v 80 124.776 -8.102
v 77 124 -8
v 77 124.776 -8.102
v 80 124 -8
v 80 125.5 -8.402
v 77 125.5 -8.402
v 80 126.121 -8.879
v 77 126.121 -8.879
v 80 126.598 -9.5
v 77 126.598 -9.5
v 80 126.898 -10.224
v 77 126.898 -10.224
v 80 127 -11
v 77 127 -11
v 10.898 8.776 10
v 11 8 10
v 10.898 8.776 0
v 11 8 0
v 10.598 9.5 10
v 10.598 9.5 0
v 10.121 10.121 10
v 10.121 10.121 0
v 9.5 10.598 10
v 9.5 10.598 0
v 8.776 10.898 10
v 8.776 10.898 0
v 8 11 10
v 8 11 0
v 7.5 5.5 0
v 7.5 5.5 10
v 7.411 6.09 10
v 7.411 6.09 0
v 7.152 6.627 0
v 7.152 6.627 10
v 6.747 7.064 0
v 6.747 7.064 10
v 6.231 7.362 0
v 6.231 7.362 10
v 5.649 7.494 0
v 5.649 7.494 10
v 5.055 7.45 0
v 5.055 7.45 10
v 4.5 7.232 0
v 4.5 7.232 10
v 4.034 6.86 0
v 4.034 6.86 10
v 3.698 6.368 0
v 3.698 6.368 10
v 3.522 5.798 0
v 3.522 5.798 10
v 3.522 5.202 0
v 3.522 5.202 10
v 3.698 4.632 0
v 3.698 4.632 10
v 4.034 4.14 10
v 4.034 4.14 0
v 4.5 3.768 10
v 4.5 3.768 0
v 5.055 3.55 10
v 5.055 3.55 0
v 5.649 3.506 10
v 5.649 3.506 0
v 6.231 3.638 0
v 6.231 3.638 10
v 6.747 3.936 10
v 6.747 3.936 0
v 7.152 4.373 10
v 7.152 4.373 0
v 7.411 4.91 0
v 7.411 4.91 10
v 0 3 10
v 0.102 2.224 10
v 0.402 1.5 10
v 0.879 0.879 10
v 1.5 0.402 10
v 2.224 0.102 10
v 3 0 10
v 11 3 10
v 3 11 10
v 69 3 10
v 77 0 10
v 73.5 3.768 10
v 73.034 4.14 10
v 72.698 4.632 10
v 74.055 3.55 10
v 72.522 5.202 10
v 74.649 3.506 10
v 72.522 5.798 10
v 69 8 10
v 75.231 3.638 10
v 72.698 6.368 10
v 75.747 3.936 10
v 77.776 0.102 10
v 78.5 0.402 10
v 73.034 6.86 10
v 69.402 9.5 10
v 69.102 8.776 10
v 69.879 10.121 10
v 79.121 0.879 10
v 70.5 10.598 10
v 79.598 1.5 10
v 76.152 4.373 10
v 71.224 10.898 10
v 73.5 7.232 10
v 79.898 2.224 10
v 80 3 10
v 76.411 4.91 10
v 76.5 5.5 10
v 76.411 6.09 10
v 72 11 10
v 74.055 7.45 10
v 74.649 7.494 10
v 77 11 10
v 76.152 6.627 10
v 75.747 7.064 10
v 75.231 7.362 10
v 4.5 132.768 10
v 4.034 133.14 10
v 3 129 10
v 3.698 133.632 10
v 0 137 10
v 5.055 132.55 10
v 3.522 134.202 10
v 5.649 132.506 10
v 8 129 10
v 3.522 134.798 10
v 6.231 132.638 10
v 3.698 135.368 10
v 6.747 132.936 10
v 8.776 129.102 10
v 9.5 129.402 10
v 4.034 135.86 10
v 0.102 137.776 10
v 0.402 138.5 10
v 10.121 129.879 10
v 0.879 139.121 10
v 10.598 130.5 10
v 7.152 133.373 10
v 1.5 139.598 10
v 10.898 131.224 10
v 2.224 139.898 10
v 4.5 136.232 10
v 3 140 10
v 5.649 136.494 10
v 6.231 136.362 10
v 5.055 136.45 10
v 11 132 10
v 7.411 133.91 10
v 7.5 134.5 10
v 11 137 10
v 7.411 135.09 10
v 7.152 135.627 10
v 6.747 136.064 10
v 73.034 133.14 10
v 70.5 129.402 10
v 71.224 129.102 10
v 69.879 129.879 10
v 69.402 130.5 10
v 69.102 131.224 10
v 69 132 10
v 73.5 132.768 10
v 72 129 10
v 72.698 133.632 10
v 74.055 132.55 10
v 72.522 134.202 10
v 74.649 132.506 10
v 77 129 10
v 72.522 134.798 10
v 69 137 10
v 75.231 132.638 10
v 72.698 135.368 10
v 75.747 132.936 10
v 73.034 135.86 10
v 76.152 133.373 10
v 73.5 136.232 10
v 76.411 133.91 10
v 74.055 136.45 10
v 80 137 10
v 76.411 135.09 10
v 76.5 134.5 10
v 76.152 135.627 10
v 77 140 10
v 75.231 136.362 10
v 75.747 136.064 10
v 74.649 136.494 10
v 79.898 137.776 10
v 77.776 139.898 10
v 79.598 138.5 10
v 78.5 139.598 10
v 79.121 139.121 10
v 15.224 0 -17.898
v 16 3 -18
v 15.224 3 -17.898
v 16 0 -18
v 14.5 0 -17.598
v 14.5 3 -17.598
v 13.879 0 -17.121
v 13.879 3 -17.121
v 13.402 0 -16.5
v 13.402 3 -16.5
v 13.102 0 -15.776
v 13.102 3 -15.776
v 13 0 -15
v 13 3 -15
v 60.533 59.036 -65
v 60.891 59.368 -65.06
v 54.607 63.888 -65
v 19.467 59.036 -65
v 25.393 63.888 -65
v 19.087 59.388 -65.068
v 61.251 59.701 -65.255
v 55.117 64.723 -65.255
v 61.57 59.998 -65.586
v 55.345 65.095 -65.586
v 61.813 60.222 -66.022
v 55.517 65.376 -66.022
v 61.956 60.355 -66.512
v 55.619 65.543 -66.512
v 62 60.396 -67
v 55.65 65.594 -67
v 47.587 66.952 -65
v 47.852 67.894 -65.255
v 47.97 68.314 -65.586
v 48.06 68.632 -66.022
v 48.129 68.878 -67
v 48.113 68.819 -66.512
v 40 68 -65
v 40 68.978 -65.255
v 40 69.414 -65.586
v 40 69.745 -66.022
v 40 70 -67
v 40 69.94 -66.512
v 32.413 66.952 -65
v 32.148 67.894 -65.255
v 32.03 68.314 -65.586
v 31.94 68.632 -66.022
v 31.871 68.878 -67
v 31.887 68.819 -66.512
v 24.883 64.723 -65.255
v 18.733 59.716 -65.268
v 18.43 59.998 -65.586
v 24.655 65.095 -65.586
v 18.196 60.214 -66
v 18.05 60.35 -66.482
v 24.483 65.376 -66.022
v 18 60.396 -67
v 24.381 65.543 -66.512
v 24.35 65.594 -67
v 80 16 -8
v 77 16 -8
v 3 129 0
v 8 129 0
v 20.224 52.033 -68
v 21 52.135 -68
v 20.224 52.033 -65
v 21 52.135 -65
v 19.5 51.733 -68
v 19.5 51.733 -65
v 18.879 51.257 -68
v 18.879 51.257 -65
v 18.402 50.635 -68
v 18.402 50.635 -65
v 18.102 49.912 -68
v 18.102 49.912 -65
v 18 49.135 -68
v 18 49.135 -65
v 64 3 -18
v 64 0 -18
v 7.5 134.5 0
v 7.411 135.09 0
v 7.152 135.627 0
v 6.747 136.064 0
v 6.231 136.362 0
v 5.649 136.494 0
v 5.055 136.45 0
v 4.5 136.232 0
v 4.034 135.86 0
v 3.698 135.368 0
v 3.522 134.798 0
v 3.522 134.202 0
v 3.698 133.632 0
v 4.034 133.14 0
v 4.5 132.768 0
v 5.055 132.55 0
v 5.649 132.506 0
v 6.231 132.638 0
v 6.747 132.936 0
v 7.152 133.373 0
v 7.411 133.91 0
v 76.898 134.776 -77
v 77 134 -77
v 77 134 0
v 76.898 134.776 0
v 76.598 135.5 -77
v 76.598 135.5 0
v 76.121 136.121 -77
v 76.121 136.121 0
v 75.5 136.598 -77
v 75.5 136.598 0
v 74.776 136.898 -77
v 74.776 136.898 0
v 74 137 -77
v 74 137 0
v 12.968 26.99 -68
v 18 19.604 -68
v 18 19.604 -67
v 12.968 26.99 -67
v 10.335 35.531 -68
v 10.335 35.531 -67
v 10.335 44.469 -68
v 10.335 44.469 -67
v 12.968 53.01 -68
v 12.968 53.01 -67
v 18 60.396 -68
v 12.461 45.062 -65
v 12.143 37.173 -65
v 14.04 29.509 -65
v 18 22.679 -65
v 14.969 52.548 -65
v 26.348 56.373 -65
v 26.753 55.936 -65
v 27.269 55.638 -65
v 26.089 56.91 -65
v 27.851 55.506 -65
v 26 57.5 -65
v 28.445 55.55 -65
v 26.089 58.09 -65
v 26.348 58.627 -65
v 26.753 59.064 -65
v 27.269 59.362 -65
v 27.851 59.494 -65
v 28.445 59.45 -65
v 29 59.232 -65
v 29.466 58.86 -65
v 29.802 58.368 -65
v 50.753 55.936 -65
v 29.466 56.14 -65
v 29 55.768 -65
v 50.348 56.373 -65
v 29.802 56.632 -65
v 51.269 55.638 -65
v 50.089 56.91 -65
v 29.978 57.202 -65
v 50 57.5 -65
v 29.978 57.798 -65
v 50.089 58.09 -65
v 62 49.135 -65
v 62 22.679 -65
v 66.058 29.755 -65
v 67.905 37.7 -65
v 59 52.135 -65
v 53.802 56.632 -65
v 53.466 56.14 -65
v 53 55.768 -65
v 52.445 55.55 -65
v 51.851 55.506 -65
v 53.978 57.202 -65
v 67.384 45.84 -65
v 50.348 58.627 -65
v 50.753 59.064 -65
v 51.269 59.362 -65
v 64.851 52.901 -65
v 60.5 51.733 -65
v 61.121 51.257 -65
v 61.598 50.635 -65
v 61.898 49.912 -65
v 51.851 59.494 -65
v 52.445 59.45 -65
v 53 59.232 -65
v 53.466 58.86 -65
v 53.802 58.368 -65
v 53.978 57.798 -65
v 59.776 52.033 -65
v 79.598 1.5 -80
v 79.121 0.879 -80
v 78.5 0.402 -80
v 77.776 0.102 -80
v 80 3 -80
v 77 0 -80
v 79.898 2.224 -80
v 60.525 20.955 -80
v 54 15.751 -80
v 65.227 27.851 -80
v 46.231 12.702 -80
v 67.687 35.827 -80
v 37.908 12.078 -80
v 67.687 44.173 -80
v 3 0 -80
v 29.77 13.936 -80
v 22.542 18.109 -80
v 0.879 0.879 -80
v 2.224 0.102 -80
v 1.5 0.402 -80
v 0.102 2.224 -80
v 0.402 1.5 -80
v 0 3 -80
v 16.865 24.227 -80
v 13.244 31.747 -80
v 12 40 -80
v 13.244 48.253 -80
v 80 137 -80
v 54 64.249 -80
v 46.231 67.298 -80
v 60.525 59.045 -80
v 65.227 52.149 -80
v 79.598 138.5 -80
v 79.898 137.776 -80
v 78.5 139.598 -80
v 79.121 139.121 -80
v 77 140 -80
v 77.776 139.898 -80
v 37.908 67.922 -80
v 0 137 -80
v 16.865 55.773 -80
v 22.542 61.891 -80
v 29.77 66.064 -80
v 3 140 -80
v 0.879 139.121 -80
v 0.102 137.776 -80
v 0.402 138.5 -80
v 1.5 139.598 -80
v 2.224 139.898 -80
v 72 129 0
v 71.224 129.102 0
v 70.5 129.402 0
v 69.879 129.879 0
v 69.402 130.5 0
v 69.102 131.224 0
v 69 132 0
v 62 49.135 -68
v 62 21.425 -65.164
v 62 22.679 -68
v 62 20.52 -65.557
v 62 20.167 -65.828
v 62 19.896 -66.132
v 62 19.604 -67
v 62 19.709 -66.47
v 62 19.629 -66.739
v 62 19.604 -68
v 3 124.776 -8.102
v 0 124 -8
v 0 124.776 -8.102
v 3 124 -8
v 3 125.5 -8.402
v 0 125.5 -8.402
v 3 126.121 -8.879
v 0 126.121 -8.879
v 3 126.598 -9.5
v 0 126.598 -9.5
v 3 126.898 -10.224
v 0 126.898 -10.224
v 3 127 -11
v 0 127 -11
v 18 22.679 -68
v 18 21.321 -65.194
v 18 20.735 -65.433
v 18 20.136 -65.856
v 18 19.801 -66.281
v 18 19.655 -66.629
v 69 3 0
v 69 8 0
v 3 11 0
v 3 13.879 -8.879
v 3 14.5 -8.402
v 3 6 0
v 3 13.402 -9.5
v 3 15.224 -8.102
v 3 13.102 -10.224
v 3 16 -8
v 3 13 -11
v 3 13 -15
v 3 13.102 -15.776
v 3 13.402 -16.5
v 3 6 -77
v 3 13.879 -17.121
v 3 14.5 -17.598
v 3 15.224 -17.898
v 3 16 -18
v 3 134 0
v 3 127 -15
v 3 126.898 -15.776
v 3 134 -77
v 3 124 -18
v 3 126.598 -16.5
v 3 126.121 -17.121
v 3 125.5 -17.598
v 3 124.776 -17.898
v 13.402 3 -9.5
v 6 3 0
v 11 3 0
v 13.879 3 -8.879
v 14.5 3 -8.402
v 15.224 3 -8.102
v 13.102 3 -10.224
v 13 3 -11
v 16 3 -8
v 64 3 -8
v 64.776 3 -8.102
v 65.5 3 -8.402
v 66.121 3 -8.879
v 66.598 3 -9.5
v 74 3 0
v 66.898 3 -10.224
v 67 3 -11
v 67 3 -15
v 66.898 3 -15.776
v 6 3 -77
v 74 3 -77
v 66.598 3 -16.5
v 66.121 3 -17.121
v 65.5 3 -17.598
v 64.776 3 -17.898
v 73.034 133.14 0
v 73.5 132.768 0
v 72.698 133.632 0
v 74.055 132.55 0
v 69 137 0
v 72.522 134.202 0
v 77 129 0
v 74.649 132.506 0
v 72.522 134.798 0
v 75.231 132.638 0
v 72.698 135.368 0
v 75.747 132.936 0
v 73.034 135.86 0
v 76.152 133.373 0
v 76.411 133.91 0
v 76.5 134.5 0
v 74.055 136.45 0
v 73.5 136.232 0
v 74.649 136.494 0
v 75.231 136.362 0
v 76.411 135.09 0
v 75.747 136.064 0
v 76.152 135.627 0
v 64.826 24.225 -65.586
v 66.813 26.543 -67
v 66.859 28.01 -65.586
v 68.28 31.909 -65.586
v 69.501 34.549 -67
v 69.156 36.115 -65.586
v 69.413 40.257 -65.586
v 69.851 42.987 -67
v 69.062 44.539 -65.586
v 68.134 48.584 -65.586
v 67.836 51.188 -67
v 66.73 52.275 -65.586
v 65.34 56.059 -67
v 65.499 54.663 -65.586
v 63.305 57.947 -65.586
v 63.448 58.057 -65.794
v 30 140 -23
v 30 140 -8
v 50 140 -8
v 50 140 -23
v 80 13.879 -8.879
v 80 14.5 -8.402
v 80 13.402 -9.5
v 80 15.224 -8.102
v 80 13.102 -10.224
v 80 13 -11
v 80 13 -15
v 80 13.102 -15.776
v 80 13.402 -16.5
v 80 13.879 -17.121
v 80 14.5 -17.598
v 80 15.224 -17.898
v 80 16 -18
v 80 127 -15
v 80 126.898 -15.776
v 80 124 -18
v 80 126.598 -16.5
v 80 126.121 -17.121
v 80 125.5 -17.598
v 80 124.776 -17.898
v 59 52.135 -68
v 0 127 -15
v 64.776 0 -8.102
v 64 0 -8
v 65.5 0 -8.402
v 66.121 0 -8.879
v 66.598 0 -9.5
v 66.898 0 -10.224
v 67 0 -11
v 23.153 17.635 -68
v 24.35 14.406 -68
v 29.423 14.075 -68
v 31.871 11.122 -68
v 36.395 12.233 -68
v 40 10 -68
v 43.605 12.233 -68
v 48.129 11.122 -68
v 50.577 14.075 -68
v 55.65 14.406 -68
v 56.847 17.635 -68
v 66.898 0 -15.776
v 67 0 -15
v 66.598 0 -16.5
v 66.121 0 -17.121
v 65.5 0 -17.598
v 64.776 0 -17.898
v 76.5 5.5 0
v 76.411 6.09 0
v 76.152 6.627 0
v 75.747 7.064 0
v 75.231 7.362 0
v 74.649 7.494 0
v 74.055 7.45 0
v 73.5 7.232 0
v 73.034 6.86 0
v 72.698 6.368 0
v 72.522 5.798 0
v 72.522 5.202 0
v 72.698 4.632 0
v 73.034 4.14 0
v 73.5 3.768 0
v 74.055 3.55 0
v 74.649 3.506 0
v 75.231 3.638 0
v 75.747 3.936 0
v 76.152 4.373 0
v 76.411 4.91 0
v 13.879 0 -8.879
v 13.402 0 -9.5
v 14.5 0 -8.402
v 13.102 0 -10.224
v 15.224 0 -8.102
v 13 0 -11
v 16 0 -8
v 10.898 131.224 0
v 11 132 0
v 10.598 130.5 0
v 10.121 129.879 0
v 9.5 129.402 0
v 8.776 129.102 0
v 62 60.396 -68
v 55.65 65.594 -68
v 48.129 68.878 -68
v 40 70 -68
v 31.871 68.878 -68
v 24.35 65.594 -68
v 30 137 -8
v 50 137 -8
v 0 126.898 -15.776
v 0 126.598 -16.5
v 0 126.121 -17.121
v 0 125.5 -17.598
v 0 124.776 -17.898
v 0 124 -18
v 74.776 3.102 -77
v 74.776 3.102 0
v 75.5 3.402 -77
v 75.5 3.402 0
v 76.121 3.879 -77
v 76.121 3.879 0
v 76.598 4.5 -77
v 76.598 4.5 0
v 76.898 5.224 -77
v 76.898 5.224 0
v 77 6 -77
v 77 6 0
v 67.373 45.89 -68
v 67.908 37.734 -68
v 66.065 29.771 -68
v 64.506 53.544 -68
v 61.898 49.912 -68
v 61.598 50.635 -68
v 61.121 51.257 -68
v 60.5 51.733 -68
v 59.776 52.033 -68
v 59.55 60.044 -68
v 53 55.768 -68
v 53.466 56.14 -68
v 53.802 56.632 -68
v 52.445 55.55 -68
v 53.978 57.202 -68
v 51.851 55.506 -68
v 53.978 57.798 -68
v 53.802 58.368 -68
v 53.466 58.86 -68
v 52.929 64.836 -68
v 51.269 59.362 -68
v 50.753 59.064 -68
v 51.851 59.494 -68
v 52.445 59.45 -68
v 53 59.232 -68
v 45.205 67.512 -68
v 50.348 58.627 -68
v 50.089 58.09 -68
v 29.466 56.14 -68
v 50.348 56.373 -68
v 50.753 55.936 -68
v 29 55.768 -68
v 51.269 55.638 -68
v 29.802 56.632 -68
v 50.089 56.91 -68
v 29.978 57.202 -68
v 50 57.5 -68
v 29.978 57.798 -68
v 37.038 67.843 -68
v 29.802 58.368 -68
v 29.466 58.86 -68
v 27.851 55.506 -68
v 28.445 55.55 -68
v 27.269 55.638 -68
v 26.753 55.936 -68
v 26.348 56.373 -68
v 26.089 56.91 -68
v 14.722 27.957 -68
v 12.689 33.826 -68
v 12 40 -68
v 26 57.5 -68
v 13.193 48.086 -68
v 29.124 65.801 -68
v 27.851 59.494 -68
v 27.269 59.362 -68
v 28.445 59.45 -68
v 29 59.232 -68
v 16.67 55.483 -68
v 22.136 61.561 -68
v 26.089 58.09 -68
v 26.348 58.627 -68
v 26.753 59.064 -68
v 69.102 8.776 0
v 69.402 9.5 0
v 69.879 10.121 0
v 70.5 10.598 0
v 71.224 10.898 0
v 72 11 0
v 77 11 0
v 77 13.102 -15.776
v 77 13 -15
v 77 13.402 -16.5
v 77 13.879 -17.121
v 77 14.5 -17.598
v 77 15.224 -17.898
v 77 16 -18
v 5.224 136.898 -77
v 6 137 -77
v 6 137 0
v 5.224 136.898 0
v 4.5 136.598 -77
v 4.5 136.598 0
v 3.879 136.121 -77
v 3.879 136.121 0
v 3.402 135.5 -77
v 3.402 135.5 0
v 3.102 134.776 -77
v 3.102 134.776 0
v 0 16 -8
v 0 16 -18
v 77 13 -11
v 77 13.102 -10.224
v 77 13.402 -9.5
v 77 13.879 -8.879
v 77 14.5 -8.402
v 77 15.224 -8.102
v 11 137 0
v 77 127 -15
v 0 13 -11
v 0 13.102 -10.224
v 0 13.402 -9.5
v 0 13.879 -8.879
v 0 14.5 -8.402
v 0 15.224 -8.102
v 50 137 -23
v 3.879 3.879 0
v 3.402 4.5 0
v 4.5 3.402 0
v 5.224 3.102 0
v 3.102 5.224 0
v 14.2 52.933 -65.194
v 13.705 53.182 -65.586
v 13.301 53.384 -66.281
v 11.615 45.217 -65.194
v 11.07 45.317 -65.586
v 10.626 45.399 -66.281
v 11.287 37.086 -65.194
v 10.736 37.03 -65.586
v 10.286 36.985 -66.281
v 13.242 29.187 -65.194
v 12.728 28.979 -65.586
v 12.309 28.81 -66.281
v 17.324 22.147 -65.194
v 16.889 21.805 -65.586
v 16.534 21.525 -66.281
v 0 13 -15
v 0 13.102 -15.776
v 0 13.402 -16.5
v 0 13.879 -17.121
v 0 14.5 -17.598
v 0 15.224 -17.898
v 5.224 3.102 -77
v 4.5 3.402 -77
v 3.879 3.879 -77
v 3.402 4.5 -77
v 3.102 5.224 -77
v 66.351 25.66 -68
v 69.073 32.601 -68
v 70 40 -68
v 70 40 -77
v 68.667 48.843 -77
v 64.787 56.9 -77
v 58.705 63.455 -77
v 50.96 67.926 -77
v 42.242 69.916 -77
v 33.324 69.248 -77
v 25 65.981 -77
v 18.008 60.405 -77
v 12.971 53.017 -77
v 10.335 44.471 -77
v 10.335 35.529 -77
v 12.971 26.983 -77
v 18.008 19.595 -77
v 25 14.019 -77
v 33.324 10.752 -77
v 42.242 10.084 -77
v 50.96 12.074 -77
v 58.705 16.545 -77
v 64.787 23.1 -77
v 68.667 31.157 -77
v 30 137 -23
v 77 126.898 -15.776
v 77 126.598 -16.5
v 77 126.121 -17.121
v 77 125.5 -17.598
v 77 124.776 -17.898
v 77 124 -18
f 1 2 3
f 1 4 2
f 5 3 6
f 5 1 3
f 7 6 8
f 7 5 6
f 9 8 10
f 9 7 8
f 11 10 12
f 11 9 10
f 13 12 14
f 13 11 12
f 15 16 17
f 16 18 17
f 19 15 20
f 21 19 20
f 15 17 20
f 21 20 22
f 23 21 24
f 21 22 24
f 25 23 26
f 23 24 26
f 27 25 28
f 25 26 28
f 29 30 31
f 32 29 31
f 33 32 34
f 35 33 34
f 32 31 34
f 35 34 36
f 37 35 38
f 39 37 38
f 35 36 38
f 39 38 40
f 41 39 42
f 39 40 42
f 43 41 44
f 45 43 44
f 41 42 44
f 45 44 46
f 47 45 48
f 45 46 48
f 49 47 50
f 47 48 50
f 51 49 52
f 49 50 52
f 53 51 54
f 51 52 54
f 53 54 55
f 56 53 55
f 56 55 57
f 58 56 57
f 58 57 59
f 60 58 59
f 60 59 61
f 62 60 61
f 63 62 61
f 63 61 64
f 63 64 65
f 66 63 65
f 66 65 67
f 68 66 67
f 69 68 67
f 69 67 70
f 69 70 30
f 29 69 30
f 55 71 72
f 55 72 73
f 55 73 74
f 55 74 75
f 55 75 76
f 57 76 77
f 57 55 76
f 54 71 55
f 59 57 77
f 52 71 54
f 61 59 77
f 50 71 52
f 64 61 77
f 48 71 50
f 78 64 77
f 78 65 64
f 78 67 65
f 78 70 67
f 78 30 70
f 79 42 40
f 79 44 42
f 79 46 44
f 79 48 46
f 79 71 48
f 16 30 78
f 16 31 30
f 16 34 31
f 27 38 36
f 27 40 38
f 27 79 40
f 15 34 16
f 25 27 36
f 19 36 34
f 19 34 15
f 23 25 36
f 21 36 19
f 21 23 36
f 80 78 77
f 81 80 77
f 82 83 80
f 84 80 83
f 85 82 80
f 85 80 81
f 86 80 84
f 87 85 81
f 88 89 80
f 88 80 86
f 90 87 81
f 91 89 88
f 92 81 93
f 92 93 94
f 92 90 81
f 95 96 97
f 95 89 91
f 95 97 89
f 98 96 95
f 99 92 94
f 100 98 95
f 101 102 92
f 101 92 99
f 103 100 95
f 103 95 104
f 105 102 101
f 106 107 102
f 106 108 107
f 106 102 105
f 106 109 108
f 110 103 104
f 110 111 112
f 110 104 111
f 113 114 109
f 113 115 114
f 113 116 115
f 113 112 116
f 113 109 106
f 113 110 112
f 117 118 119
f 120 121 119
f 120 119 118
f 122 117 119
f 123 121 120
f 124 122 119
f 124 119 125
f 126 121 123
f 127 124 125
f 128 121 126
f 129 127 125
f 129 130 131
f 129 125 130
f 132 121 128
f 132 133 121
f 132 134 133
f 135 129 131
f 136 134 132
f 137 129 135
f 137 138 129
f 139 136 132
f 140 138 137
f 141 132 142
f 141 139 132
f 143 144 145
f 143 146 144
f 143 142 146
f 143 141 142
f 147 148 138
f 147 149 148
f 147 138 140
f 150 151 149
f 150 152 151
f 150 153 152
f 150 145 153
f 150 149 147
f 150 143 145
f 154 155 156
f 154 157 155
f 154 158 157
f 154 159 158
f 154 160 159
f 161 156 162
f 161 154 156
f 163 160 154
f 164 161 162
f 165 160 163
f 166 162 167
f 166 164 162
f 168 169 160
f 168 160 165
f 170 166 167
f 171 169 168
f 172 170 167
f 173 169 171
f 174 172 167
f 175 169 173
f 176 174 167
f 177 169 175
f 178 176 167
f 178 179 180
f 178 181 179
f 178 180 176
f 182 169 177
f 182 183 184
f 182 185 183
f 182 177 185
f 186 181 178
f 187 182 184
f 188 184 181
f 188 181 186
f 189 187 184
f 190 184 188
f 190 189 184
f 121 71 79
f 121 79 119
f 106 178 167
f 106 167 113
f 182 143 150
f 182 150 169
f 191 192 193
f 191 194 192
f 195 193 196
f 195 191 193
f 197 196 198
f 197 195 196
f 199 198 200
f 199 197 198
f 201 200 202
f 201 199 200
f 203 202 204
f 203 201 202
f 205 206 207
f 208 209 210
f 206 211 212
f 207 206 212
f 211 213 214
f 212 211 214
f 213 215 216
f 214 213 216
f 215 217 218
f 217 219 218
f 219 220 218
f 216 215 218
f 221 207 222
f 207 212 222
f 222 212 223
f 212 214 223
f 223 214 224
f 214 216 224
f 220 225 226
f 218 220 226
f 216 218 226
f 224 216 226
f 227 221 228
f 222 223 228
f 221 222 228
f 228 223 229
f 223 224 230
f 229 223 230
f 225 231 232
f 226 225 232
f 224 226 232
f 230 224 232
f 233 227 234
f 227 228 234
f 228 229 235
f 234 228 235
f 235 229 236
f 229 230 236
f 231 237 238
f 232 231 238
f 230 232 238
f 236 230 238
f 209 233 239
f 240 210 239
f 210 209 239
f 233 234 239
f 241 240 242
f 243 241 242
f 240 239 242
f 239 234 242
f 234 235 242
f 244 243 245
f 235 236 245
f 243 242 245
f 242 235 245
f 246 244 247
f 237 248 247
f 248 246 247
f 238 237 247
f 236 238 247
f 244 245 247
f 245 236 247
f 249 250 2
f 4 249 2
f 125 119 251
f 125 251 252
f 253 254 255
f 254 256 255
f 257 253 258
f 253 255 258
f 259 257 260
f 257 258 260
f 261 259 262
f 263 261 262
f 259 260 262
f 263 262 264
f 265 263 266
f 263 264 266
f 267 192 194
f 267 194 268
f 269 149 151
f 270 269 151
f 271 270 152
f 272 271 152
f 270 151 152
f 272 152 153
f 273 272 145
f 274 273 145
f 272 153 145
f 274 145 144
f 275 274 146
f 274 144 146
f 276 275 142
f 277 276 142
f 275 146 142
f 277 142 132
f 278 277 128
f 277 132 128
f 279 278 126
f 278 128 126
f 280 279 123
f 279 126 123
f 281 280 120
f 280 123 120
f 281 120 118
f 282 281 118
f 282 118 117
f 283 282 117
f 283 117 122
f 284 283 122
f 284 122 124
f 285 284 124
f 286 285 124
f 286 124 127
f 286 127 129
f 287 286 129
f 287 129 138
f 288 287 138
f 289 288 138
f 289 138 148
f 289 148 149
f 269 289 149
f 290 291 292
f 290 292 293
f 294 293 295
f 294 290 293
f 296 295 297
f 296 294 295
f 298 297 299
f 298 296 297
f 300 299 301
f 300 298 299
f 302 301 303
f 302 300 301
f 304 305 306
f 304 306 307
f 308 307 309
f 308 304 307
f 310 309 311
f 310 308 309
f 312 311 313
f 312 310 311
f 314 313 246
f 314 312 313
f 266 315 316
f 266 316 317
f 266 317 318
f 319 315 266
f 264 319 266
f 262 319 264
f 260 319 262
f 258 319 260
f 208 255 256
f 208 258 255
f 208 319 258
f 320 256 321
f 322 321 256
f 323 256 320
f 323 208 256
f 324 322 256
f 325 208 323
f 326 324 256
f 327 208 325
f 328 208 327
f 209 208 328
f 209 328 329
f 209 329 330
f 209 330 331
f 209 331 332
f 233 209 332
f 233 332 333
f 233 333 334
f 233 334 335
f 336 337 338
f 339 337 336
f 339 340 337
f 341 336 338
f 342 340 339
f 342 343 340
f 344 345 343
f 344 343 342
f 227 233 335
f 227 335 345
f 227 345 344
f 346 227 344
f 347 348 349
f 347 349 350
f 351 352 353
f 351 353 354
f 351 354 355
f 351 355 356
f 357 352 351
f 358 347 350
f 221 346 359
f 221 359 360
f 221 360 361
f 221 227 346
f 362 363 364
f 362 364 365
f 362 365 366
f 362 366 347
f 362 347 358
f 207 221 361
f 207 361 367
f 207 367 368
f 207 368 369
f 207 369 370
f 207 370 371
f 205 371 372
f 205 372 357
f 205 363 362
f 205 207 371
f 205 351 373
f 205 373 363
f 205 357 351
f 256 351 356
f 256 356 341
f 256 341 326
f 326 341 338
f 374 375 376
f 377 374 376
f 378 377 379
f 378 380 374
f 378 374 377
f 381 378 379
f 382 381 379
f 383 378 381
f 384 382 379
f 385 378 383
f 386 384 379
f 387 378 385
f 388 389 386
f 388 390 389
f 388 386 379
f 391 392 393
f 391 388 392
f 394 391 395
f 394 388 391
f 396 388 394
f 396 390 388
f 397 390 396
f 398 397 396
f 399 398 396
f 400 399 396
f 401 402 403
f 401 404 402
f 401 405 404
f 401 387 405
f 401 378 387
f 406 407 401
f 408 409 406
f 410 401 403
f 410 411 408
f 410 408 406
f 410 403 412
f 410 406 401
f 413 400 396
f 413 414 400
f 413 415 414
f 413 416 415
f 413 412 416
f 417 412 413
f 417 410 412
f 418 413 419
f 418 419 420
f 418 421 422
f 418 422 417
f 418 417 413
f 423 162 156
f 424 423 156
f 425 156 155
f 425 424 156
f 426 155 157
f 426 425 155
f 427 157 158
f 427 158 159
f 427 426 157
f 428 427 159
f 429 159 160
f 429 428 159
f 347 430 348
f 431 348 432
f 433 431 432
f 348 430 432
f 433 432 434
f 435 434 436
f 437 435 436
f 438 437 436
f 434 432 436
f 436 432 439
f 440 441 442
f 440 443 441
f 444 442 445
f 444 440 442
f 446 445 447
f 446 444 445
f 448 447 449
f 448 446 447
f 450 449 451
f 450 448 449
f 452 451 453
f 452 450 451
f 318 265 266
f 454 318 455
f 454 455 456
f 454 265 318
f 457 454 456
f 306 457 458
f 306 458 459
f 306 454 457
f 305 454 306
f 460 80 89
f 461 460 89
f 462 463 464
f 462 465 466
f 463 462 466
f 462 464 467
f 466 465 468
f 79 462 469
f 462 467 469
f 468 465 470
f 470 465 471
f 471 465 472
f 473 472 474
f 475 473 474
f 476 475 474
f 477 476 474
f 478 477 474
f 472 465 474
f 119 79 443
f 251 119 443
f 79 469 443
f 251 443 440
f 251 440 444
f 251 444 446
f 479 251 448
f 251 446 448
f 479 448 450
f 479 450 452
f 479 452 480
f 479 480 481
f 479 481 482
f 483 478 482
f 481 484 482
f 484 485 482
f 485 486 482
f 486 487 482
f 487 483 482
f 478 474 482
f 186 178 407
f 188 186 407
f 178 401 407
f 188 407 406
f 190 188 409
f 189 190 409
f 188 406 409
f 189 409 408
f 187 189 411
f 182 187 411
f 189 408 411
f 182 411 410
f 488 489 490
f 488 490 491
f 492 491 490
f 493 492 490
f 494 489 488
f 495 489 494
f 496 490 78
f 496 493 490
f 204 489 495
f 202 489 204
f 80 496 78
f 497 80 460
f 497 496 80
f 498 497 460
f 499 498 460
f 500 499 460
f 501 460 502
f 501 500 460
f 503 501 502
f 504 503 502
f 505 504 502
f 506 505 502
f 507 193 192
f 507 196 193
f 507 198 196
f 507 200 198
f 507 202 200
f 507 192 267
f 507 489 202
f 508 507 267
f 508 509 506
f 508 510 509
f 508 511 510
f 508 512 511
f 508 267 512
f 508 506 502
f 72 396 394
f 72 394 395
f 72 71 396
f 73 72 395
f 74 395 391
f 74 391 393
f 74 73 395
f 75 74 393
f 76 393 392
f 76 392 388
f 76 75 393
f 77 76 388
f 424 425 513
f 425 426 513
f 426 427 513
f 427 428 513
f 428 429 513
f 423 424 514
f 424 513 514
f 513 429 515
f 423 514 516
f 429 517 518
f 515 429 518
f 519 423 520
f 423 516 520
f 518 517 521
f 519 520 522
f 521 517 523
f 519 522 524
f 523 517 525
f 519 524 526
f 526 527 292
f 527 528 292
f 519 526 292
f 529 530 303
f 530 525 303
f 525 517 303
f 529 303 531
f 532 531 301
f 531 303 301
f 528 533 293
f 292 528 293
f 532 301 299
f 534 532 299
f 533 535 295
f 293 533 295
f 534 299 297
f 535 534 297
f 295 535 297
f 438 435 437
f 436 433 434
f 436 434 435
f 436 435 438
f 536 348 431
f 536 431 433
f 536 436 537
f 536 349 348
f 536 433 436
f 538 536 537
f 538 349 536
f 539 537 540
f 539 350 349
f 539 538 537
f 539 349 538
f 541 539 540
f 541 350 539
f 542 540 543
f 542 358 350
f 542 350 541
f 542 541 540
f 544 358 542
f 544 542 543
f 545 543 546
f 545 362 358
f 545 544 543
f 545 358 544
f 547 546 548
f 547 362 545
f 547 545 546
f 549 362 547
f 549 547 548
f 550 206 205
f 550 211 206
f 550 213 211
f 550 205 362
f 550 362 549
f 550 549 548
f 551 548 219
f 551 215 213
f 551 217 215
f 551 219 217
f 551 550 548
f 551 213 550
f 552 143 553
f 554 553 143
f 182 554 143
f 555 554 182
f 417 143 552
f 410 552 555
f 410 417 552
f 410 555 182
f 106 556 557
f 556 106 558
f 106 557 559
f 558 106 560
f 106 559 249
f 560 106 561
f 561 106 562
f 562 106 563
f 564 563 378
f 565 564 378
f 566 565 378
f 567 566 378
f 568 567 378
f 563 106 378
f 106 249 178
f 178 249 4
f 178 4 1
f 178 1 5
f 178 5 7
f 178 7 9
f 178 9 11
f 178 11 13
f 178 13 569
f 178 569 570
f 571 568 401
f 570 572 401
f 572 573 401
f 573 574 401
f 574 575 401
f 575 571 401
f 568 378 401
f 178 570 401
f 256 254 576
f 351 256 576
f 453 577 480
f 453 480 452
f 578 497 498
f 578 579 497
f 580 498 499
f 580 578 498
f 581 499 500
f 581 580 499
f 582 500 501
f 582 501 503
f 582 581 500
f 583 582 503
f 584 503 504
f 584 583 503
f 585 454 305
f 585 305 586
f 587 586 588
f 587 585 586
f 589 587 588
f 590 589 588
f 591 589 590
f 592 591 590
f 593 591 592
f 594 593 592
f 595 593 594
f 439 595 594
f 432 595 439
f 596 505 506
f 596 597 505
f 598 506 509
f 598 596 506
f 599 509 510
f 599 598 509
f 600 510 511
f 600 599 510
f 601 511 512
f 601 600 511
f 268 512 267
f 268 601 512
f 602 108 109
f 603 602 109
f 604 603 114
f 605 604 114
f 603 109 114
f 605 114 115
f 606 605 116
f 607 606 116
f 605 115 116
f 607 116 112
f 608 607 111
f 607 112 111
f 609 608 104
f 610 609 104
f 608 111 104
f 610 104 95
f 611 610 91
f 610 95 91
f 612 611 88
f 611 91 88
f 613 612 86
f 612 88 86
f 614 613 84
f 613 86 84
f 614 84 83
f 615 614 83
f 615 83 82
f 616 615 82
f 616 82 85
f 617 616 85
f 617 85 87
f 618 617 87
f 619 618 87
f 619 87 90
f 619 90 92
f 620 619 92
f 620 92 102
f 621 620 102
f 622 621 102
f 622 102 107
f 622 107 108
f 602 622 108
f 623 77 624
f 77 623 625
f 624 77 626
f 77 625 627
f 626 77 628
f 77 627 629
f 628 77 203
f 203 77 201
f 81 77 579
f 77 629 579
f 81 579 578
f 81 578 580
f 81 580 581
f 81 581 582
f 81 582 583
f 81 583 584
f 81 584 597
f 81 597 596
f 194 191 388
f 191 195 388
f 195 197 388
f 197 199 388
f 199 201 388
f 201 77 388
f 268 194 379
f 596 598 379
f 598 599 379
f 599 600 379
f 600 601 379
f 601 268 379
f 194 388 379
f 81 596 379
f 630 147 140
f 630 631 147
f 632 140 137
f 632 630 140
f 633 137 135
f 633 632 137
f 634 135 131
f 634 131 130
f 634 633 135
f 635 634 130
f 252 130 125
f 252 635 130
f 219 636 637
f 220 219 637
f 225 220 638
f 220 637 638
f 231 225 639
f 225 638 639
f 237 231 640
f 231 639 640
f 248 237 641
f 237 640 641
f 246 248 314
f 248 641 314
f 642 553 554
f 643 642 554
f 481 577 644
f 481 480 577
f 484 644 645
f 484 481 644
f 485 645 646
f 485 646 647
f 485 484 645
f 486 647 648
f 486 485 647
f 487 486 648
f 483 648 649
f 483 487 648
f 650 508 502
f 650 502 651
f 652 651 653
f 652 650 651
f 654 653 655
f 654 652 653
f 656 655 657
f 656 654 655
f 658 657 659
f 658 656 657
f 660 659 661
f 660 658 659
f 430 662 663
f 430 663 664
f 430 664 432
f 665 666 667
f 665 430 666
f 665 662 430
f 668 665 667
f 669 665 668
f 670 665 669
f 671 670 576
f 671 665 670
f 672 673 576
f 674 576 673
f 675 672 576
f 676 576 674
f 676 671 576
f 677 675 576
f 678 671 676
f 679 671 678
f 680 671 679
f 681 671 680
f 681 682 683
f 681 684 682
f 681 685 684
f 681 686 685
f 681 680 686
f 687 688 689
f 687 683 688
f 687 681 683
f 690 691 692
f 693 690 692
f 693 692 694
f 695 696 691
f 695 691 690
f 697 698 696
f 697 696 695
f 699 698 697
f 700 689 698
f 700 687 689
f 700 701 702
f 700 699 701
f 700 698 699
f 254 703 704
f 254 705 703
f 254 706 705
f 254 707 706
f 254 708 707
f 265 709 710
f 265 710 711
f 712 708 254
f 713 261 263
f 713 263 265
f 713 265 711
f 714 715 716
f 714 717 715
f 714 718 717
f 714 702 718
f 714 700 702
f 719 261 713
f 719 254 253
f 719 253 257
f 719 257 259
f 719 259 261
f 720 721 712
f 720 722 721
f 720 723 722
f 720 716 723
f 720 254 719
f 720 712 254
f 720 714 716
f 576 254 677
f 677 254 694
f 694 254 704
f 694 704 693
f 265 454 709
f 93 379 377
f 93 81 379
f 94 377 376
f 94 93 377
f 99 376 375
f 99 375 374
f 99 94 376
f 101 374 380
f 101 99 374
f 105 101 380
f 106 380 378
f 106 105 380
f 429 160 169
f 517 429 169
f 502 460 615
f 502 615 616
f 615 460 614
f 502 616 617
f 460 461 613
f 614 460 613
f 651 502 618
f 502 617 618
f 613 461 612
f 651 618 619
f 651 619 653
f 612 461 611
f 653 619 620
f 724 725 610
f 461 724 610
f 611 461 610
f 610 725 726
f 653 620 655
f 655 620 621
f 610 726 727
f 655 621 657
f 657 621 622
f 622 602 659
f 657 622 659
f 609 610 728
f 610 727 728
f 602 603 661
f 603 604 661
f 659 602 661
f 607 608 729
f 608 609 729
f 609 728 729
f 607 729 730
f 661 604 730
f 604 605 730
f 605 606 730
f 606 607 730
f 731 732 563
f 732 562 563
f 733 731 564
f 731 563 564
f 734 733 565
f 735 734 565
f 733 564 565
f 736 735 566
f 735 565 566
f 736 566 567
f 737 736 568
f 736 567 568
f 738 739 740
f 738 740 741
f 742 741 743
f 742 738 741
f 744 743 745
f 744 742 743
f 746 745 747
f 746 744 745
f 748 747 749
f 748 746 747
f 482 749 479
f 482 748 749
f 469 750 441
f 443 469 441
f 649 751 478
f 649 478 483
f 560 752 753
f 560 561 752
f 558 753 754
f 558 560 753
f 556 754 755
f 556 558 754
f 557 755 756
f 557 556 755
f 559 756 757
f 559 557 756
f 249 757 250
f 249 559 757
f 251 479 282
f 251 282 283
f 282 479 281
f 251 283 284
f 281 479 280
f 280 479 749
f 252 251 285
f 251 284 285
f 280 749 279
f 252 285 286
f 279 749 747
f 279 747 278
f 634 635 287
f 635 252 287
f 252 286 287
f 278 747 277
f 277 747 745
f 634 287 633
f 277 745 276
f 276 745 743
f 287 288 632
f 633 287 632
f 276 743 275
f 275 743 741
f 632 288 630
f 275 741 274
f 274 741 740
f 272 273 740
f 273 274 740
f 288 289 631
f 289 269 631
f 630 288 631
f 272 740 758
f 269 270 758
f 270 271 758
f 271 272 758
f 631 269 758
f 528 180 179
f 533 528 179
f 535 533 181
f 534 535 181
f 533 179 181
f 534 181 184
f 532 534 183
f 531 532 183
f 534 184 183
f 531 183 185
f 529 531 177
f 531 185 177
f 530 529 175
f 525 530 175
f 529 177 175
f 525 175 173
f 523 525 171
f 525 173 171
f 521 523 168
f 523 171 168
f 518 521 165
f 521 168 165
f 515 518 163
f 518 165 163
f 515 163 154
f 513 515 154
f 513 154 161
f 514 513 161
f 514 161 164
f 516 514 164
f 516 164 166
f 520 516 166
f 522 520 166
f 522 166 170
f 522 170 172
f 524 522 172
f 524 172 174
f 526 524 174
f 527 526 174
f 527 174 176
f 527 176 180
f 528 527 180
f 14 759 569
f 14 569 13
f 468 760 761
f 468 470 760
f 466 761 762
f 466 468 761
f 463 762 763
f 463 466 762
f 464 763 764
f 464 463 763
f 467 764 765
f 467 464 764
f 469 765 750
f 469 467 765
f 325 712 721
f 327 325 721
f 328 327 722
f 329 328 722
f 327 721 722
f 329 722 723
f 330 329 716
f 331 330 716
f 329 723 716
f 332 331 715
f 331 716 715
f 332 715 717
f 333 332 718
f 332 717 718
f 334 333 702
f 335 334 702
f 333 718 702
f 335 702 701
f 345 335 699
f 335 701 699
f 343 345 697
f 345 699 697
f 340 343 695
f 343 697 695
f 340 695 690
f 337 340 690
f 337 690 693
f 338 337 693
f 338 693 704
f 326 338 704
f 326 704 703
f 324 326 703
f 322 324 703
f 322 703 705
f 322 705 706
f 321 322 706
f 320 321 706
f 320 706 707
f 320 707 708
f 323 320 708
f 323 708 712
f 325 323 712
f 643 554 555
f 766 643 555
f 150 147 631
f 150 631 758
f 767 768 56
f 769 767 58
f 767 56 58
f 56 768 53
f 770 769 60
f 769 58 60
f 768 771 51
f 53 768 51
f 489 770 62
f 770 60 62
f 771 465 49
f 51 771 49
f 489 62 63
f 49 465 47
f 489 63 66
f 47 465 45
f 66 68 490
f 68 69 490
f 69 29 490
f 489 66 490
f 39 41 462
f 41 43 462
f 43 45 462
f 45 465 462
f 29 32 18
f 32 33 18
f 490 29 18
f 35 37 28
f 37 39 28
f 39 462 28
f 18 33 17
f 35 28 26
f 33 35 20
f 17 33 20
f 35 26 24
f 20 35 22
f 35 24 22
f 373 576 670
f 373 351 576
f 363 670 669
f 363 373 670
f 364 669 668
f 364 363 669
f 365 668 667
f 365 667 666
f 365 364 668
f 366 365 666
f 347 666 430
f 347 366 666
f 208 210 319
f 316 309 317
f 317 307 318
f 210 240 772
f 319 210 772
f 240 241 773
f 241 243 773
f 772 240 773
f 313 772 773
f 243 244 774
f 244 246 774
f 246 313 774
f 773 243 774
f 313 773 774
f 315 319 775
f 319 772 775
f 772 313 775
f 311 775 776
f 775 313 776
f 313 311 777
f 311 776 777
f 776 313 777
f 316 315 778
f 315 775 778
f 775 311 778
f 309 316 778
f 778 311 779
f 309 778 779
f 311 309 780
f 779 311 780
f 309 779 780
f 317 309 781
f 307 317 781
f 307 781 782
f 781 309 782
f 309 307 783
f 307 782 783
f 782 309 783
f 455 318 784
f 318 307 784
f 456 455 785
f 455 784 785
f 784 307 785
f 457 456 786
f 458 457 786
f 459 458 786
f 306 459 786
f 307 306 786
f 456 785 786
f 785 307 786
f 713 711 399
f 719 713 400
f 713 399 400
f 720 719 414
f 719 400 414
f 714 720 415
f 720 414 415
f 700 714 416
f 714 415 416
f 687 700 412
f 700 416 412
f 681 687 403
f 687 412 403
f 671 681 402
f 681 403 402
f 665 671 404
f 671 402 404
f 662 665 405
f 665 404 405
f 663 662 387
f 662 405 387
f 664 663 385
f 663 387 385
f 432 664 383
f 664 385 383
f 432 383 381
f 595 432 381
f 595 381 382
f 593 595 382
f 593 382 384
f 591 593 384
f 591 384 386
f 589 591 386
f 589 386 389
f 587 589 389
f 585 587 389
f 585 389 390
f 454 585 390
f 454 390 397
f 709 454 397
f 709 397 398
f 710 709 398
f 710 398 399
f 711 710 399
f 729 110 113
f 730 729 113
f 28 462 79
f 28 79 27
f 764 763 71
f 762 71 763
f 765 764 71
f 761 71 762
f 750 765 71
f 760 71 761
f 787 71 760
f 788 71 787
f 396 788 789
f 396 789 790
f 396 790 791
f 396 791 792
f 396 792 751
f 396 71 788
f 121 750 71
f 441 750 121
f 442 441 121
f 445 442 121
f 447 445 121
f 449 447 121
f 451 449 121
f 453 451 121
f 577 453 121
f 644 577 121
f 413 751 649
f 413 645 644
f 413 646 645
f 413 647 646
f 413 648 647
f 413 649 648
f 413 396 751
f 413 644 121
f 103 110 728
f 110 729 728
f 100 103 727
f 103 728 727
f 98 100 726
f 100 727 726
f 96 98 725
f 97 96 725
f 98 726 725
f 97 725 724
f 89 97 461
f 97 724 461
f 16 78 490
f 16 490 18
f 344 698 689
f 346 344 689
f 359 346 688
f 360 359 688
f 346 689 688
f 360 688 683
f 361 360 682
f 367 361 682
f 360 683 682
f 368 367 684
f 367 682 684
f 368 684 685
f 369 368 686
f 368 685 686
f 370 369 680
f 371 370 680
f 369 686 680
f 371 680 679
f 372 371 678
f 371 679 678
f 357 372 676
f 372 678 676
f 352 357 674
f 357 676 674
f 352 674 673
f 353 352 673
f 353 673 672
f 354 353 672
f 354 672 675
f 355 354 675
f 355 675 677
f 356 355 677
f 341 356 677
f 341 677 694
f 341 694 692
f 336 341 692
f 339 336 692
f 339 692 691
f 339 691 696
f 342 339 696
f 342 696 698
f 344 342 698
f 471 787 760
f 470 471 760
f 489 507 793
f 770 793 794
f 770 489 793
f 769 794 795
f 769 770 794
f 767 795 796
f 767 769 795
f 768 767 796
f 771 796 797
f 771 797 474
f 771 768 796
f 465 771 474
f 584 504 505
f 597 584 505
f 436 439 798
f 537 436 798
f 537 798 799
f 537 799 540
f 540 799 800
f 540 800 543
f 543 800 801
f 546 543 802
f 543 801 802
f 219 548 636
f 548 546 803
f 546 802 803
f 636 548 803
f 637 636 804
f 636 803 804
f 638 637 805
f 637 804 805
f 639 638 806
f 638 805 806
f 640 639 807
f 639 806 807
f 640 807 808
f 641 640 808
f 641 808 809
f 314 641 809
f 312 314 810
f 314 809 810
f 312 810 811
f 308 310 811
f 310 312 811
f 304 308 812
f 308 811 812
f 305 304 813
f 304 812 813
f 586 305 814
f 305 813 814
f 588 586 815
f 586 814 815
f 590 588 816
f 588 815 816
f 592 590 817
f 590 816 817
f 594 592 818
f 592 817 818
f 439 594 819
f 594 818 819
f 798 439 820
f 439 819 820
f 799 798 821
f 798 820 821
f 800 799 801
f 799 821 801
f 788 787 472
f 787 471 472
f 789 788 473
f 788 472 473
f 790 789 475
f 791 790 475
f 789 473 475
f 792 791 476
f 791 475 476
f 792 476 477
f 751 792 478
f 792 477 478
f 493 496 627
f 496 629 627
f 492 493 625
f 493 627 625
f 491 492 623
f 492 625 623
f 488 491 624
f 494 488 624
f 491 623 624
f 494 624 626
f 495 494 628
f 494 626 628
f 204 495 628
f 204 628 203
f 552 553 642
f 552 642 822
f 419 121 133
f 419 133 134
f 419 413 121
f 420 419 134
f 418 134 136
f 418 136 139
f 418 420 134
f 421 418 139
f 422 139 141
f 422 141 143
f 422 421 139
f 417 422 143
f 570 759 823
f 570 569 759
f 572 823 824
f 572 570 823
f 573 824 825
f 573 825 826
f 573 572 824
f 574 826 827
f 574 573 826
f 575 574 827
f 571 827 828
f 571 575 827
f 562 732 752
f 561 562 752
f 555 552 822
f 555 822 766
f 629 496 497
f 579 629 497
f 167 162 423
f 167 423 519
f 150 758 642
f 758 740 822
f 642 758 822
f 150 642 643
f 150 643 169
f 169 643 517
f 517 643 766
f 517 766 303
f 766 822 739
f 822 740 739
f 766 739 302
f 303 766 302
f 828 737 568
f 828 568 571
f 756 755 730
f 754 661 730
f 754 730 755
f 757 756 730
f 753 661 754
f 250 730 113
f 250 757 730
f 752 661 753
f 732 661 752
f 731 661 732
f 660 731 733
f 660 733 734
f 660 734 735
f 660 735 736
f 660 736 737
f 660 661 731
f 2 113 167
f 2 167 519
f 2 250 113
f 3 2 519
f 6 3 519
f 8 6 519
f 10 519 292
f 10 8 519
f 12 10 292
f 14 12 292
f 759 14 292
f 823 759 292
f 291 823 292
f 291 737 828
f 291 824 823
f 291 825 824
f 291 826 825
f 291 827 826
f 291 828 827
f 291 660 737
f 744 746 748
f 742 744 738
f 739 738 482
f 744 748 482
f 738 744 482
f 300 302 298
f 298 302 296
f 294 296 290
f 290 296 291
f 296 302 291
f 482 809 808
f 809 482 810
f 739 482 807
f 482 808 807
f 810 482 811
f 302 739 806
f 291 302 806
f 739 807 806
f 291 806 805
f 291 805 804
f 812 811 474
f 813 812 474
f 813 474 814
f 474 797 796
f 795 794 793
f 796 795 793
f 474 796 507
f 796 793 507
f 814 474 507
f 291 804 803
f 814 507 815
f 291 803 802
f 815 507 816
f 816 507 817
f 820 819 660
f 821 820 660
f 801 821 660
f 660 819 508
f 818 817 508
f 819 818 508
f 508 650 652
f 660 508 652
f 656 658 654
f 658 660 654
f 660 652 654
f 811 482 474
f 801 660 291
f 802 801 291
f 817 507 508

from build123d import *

# Parameters (mm, degrees)
SKETCH1_W               = 80
SKETCH1_H               = 80
BOSS_EXTRUDE1_DEPTH     = 80
SHELL1_T                = -3
CUT_EXTRUDE1_REACH      = 140.564
SKETCH2_R               = 27
SKETCH3_R               = 30
SKETCH3_R_2             = 27
BOSS_EXTRUDE2_DEPTH     = 9
BOSS_EXTRUDE3_DEPTH     = 3
SKETCH5_W               = 104.199084268
SKETCH5_H               = 10
CUT_EXTRUDE2_DEPTH      = 139.564064606
CUT_EXTRUDE2_DEPTH_BACK = 139.564064606
BOSS_EXTRUDE4_DEPTH     = 3
FILLET3_R               = 3
FILLET4_R               = 2
CUT_EXTRUDE5_REACH      = 129.138
SKETCH9_R               = 2
SKETCH13_W              = 80
SKETCH13_H              = 60
BOSS_EXTRUDE6_DEPTH     = 70
SKETCH14_W              = 74
SKETCH14_H              = 60
CUT_EXTRUDE8_DEPTH      = 67
SKETCH15_W              = 80
SKETCH15_H              = 140
SKETCH15_W_2            = 74
SKETCH15_H_2            = 134
BOSS_EXTRUDE7_DEPTH     = 20
SKETCH12_R              = 28
CUT_EXTRUDE7_DEPTH      = 12
FILLET5_R               = 3
SKETCH16_W              = 9.113547255
SKETCH16_H              = 9.484027798
SKETCH16_W_2            = 8
SKETCH16_H_2            = 8
BOSS_EXTRUDE8_DEPTH     = 10
SKETCH17_W              = 10
SKETCH17_H              = 114
CUT_EXTRUDE9_DEPTH      = 181
CUT_EXTRUDE10_START     = -10
SKETCH18_W              = 54
SKETCH18_H              = 10
CUT_EXTRUDE10_DEPTH     = 171
FILLET6_R               = 3
CUT_EXTRUDE11_REACH     = 186.662
SKETCH19_R              = 2
FILLET7_R               = 3
CUT_EXTRUDE12_REACH     = 182
SKETCH20_W              = 20
SKETCH20_H              = 15


with BuildPart() as part:
    # Sketch1 → Boss-Extrude1 (new body)
    with BuildSketch(Plane(origin=(0, 0, 0), x_dir=(1, 0, 0), z_dir=(0, 1, 0))):
        with Locations((40, 40)):
            Rectangle(SKETCH1_W, SKETCH1_H)
    extrude(amount=BOSS_EXTRUDE1_DEPTH)

    # Shell1
    shell1_openings = [part.faces().sort_by_distance(p)[0] for p in [
        (40, 40, 0),
    ]]
    offset(amount=SHELL1_T, openings=shell1_openings, kind=Kind.INTERSECTION)

    # Sketch2 → Cut-Extrude1 (cut, up to next)
    with BuildSketch(Plane(origin=(0, 0, -80), x_dir=(-1, 0, 0), z_dir=(0, 0, -1)), mode=Mode.PRIVATE) as cut_extrude1_sk1:
        with Locations((-40, 40)):
            Circle(SKETCH2_R)
    cut_extrude1_tool1 = extrude(cut_extrude1_sk1.sketch, amount=-CUT_EXTRUDE1_REACH, mode=Mode.PRIVATE) & part.part
    add(cut_extrude1_tool1.solids().sort_by_distance((40, 40, -80))[0], mode=Mode.SUBTRACT)

    # Sketch3 → Boss-Extrude2 (add)
    with BuildSketch(Plane.XY.offset(-77)):
        with Locations((40, 40)):
            Circle(SKETCH3_R)
        with Locations(Location((40, 40, 0), (0, 0, 180))):
            Circle(SKETCH3_R_2, mode=Mode.SUBTRACT)
    extrude(amount=BOSS_EXTRUDE2_DEPTH)

    # Sketch4 → Boss-Extrude3 (add)
    with BuildSketch(Plane.XY.offset(-68)):
        with BuildLine():
            Line((18, 60.396078054), (18, 19.603921946))
            ThreePointArc((18, 19.603921946), (10, 40), (18, 60.396078054))
        make_face()
        with BuildLine():
            Line((62, 60.396078054), (62, 19.603921946))
            ThreePointArc((62, 19.603921946), (70, 40), (62, 60.396078054))
        make_face()
    extrude(amount=BOSS_EXTRUDE3_DEPTH)

    # Sketch5 → Cut-Extrude2 (cut, two sides)
    with BuildSketch(Plane.XZ) as cut_extrude2_sk:
        with Locations((52.099542134, -5)):
            Rectangle(SKETCH5_W, SKETCH5_H)
    extrude(amount=CUT_EXTRUDE2_DEPTH, mode=Mode.SUBTRACT)
    extrude(cut_extrude2_sk.sketch, amount=-CUT_EXTRUDE2_DEPTH_BACK, mode=Mode.SUBTRACT)

    # Sketch8 → Boss-Extrude4 (add)
    with BuildSketch(Plane.XY.offset(-68)):
        with BuildLine():
            Line((18, 60.396078054), (18, 52.135192758))
            Line((18, 52.135192758), (62, 52.135192758))
            Line((62, 52.135192758), (62, 60.396078054))
            ThreePointArc((62, 60.396078054), (40, 70), (18, 60.396078054))
        make_face()
    extrude(amount=BOSS_EXTRUDE4_DEPTH)

    # Fillet3
    fillet3_edges = [part.edges().sort_by_distance(p)[0] for p in [
        (18, 52.135192758, -66.5),
        (62, 52.135192758, -66.5),
    ]]
    fillet(fillet3_edges, radius=FILLET3_R)

    # Fillet4
    fillet4_edges = [part.edges().sort_by_distance(p)[0] for p in [
        (40, 70, -65),
    ]]
    fillet(fillet4_edges, radius=FILLET4_R)

    # Sketch9 → Cut-Extrude5 (cut, up to next)
    with BuildSketch(Plane(origin=(0, 0, -68), x_dir=(-1, 0, 0), z_dir=(0, 0, -1)), mode=Mode.PRIVATE) as cut_extrude5_sk1:
        with Locations((-52, 57.5)):
            Circle(SKETCH9_R)
    cut_extrude5_tool1 = extrude(cut_extrude5_sk1.sketch, amount=-CUT_EXTRUDE5_REACH, mode=Mode.PRIVATE) & part.part
    # Sketch9 → Cut-Extrude5 (cut, up to next)
    with BuildSketch(Plane(origin=(0, 0, -68), x_dir=(-1, 0, 0), z_dir=(0, 0, -1)), mode=Mode.PRIVATE) as cut_extrude5_sk2:
        with Locations((-28, 57.5)):
            Circle(SKETCH9_R)
    cut_extrude5_tool2 = extrude(cut_extrude5_sk2.sketch, amount=-CUT_EXTRUDE5_REACH, mode=Mode.PRIVATE) & part.part
    add(cut_extrude5_tool1.solids().sort_by_distance((52, 57.5, -68))[0], mode=Mode.SUBTRACT)
    add(cut_extrude5_tool2.solids().sort_by_distance((28, 57.5, -68))[0], mode=Mode.SUBTRACT)

    # Sketch13 → Boss-Extrude6 (add)
    with BuildSketch(Plane(origin=(0, 0, -80), x_dir=(-1, 0, 0), z_dir=(0, 0, -1))):
        with Locations((-40, 110)):
            Rectangle(SKETCH13_W, SKETCH13_H)
    extrude(amount=-BOSS_EXTRUDE6_DEPTH)

    # Sketch14 → Cut-Extrude8 (cut)
    with BuildSketch(Plane.XY.offset(-10)):
        with Locations((40, 107)):
            Rectangle(SKETCH14_W, SKETCH14_H)
    extrude(amount=-CUT_EXTRUDE8_DEPTH, mode=Mode.SUBTRACT)

    # Sketch15 → Boss-Extrude7 (add)
    with BuildSketch(Plane.XY.offset(-10)):
        with Locations((40, 70)):
            Rectangle(SKETCH15_W, SKETCH15_H)
        with Locations((40, 70)):
            Rectangle(SKETCH15_W_2, SKETCH15_H_2, mode=Mode.SUBTRACT)
    extrude(amount=BOSS_EXTRUDE7_DEPTH)

    # Sketch12 → Cut-Extrude7 (cut)
    with BuildSketch(Plane(origin=(0, 0, -80), x_dir=(-1, 0, 0), z_dir=(0, 0, -1))):
        with Locations((-40, 40)):
            Circle(SKETCH12_R)
    extrude(amount=-CUT_EXTRUDE7_DEPTH, mode=Mode.SUBTRACT)

    # Fillet5
    fillet5_edges = [part.edges().sort_by_distance(p)[0] for p in [
        (80, 140, -45),
        (0, 140, -45),
        (3, 137, -43.5),
        (77, 137, -43.5),
        (3, 3, -43.5),
        (77, 3, -43.5),
        (0, 0, -45),
        (80, 0, -45),
    ]]
    fillet(fillet5_edges, radius=FILLET5_R)

    # Sketch16 → Boss-Extrude8 (add)
    with BuildSketch(Plane.XY.offset(10)):
        with Locations((6.443226372, 6.257986101)):
            Rectangle(SKETCH16_W, SKETCH16_H)
        with Locations((73, 7)):
            Rectangle(SKETCH16_W_2, SKETCH16_H_2)
        with Locations((73, 133)):
            Rectangle(SKETCH16_W_2, SKETCH16_H_2)
        with Locations((7, 133)):
            Rectangle(SKETCH16_W_2, SKETCH16_H_2)
    extrude(amount=-BOSS_EXTRUDE8_DEPTH)

    # Sketch17 → Cut-Extrude9 (cut, through all)
    with BuildSketch(Plane.ZY):
        with Locations((-13, 70)):
            Rectangle(SKETCH17_W, SKETCH17_H)
    extrude(amount=-CUT_EXTRUDE9_DEPTH, mode=Mode.SUBTRACT)

    # Sketch18 → Cut-Extrude10 (cut, through all)
    with BuildSketch(Plane(origin=(0, 140, 0), x_dir=(1, 0, 0), z_dir=(0, 1, 0)).offset(CUT_EXTRUDE10_START)):
        with Locations((40, 13)):
            Rectangle(SKETCH18_W, SKETCH18_H)
    extrude(amount=-CUT_EXTRUDE10_DEPTH, mode=Mode.SUBTRACT)

    # Fillet6
    fillet6_edges = [part.edges().sort_by_distance(p)[0] for p in [
        (1.5, 13, -18),
        (1.5, 127, -18),
        (1.5, 127, -8),
        (1.5, 13, -8),
        (78.5, 13, -18),
        (78.5, 127, -18),
        (78.5, 127, -8),
        (78.5, 13, -8),
        (13, 1.5, -8),
        (13, 1.5, -18),
        (67, 1.5, -18),
        (67, 1.5, -8),
    ]]
    fillet(fillet6_edges, radius=FILLET6_R)

    # Sketch19 → Cut-Extrude11 (cut, up to next)
    with BuildSketch(Plane.XY.offset(10), mode=Mode.PRIVATE) as cut_extrude11_sk1:
        with Locations((5.5, 134.5)):
            Circle(SKETCH19_R)
    cut_extrude11_tool1 = extrude(cut_extrude11_sk1.sketch, amount=-CUT_EXTRUDE11_REACH, mode=Mode.PRIVATE) & part.part
    # Sketch19 → Cut-Extrude11 (cut, up to next)
    with BuildSketch(Plane.XY.offset(10), mode=Mode.PRIVATE) as cut_extrude11_sk2:
        with Locations((74.5, 134.5)):
            Circle(SKETCH19_R)
    cut_extrude11_tool2 = extrude(cut_extrude11_sk2.sketch, amount=-CUT_EXTRUDE11_REACH, mode=Mode.PRIVATE) & part.part
    # Sketch19 → Cut-Extrude11 (cut, up to next)
    with BuildSketch(Plane.XY.offset(10), mode=Mode.PRIVATE) as cut_extrude11_sk3:
        with Locations((74.5, 5.5)):
            Circle(SKETCH19_R)
    cut_extrude11_tool3 = extrude(cut_extrude11_sk3.sketch, amount=-CUT_EXTRUDE11_REACH, mode=Mode.PRIVATE) & part.part
    # Sketch19 → Cut-Extrude11 (cut, up to next)
    with BuildSketch(Plane.XY.offset(10), mode=Mode.PRIVATE) as cut_extrude11_sk4:
        with Locations((5.5, 5.5)):
            Circle(SKETCH19_R)
    cut_extrude11_tool4 = extrude(cut_extrude11_sk4.sketch, amount=-CUT_EXTRUDE11_REACH, mode=Mode.PRIVATE) & part.part
    add(cut_extrude11_tool1.solids().sort_by_distance((5.5, 134.5, 10))[0], mode=Mode.SUBTRACT)
    add(cut_extrude11_tool2.solids().sort_by_distance((74.5, 134.5, 10))[0], mode=Mode.SUBTRACT)
    add(cut_extrude11_tool3.solids().sort_by_distance((74.5, 5.5, 10))[0], mode=Mode.SUBTRACT)
    add(cut_extrude11_tool4.solids().sort_by_distance((5.5, 5.5, 10))[0], mode=Mode.SUBTRACT)

    # Fillet7
    fillet7_edges = [part.edges().sort_by_distance(p)[0] for p in [
        (11, 11, 5),
        (69, 11, 5),
        (69, 129, 5),
        (11, 129, 5),
    ]]
    fillet(fillet7_edges, radius=FILLET7_R)

    # Sketch20 → Cut-Extrude12 (cut, up to next)
    with BuildSketch(Plane(origin=(0, 140, 0), x_dir=(1, 0, 0), z_dir=(0, 1, 0)), mode=Mode.PRIVATE) as cut_extrude12_sk1:
        with Locations((40, 15.5)):
            Rectangle(SKETCH20_W, SKETCH20_H)
    cut_extrude12_tool1 = extrude(cut_extrude12_sk1.sketch, amount=-CUT_EXTRUDE12_REACH, mode=Mode.PRIVATE) & part.part
    add(cut_extrude12_tool1.solids().sort_by_distance((40, 140, -15.5))[0], mode=Mode.SUBTRACT)


solid = part.part
